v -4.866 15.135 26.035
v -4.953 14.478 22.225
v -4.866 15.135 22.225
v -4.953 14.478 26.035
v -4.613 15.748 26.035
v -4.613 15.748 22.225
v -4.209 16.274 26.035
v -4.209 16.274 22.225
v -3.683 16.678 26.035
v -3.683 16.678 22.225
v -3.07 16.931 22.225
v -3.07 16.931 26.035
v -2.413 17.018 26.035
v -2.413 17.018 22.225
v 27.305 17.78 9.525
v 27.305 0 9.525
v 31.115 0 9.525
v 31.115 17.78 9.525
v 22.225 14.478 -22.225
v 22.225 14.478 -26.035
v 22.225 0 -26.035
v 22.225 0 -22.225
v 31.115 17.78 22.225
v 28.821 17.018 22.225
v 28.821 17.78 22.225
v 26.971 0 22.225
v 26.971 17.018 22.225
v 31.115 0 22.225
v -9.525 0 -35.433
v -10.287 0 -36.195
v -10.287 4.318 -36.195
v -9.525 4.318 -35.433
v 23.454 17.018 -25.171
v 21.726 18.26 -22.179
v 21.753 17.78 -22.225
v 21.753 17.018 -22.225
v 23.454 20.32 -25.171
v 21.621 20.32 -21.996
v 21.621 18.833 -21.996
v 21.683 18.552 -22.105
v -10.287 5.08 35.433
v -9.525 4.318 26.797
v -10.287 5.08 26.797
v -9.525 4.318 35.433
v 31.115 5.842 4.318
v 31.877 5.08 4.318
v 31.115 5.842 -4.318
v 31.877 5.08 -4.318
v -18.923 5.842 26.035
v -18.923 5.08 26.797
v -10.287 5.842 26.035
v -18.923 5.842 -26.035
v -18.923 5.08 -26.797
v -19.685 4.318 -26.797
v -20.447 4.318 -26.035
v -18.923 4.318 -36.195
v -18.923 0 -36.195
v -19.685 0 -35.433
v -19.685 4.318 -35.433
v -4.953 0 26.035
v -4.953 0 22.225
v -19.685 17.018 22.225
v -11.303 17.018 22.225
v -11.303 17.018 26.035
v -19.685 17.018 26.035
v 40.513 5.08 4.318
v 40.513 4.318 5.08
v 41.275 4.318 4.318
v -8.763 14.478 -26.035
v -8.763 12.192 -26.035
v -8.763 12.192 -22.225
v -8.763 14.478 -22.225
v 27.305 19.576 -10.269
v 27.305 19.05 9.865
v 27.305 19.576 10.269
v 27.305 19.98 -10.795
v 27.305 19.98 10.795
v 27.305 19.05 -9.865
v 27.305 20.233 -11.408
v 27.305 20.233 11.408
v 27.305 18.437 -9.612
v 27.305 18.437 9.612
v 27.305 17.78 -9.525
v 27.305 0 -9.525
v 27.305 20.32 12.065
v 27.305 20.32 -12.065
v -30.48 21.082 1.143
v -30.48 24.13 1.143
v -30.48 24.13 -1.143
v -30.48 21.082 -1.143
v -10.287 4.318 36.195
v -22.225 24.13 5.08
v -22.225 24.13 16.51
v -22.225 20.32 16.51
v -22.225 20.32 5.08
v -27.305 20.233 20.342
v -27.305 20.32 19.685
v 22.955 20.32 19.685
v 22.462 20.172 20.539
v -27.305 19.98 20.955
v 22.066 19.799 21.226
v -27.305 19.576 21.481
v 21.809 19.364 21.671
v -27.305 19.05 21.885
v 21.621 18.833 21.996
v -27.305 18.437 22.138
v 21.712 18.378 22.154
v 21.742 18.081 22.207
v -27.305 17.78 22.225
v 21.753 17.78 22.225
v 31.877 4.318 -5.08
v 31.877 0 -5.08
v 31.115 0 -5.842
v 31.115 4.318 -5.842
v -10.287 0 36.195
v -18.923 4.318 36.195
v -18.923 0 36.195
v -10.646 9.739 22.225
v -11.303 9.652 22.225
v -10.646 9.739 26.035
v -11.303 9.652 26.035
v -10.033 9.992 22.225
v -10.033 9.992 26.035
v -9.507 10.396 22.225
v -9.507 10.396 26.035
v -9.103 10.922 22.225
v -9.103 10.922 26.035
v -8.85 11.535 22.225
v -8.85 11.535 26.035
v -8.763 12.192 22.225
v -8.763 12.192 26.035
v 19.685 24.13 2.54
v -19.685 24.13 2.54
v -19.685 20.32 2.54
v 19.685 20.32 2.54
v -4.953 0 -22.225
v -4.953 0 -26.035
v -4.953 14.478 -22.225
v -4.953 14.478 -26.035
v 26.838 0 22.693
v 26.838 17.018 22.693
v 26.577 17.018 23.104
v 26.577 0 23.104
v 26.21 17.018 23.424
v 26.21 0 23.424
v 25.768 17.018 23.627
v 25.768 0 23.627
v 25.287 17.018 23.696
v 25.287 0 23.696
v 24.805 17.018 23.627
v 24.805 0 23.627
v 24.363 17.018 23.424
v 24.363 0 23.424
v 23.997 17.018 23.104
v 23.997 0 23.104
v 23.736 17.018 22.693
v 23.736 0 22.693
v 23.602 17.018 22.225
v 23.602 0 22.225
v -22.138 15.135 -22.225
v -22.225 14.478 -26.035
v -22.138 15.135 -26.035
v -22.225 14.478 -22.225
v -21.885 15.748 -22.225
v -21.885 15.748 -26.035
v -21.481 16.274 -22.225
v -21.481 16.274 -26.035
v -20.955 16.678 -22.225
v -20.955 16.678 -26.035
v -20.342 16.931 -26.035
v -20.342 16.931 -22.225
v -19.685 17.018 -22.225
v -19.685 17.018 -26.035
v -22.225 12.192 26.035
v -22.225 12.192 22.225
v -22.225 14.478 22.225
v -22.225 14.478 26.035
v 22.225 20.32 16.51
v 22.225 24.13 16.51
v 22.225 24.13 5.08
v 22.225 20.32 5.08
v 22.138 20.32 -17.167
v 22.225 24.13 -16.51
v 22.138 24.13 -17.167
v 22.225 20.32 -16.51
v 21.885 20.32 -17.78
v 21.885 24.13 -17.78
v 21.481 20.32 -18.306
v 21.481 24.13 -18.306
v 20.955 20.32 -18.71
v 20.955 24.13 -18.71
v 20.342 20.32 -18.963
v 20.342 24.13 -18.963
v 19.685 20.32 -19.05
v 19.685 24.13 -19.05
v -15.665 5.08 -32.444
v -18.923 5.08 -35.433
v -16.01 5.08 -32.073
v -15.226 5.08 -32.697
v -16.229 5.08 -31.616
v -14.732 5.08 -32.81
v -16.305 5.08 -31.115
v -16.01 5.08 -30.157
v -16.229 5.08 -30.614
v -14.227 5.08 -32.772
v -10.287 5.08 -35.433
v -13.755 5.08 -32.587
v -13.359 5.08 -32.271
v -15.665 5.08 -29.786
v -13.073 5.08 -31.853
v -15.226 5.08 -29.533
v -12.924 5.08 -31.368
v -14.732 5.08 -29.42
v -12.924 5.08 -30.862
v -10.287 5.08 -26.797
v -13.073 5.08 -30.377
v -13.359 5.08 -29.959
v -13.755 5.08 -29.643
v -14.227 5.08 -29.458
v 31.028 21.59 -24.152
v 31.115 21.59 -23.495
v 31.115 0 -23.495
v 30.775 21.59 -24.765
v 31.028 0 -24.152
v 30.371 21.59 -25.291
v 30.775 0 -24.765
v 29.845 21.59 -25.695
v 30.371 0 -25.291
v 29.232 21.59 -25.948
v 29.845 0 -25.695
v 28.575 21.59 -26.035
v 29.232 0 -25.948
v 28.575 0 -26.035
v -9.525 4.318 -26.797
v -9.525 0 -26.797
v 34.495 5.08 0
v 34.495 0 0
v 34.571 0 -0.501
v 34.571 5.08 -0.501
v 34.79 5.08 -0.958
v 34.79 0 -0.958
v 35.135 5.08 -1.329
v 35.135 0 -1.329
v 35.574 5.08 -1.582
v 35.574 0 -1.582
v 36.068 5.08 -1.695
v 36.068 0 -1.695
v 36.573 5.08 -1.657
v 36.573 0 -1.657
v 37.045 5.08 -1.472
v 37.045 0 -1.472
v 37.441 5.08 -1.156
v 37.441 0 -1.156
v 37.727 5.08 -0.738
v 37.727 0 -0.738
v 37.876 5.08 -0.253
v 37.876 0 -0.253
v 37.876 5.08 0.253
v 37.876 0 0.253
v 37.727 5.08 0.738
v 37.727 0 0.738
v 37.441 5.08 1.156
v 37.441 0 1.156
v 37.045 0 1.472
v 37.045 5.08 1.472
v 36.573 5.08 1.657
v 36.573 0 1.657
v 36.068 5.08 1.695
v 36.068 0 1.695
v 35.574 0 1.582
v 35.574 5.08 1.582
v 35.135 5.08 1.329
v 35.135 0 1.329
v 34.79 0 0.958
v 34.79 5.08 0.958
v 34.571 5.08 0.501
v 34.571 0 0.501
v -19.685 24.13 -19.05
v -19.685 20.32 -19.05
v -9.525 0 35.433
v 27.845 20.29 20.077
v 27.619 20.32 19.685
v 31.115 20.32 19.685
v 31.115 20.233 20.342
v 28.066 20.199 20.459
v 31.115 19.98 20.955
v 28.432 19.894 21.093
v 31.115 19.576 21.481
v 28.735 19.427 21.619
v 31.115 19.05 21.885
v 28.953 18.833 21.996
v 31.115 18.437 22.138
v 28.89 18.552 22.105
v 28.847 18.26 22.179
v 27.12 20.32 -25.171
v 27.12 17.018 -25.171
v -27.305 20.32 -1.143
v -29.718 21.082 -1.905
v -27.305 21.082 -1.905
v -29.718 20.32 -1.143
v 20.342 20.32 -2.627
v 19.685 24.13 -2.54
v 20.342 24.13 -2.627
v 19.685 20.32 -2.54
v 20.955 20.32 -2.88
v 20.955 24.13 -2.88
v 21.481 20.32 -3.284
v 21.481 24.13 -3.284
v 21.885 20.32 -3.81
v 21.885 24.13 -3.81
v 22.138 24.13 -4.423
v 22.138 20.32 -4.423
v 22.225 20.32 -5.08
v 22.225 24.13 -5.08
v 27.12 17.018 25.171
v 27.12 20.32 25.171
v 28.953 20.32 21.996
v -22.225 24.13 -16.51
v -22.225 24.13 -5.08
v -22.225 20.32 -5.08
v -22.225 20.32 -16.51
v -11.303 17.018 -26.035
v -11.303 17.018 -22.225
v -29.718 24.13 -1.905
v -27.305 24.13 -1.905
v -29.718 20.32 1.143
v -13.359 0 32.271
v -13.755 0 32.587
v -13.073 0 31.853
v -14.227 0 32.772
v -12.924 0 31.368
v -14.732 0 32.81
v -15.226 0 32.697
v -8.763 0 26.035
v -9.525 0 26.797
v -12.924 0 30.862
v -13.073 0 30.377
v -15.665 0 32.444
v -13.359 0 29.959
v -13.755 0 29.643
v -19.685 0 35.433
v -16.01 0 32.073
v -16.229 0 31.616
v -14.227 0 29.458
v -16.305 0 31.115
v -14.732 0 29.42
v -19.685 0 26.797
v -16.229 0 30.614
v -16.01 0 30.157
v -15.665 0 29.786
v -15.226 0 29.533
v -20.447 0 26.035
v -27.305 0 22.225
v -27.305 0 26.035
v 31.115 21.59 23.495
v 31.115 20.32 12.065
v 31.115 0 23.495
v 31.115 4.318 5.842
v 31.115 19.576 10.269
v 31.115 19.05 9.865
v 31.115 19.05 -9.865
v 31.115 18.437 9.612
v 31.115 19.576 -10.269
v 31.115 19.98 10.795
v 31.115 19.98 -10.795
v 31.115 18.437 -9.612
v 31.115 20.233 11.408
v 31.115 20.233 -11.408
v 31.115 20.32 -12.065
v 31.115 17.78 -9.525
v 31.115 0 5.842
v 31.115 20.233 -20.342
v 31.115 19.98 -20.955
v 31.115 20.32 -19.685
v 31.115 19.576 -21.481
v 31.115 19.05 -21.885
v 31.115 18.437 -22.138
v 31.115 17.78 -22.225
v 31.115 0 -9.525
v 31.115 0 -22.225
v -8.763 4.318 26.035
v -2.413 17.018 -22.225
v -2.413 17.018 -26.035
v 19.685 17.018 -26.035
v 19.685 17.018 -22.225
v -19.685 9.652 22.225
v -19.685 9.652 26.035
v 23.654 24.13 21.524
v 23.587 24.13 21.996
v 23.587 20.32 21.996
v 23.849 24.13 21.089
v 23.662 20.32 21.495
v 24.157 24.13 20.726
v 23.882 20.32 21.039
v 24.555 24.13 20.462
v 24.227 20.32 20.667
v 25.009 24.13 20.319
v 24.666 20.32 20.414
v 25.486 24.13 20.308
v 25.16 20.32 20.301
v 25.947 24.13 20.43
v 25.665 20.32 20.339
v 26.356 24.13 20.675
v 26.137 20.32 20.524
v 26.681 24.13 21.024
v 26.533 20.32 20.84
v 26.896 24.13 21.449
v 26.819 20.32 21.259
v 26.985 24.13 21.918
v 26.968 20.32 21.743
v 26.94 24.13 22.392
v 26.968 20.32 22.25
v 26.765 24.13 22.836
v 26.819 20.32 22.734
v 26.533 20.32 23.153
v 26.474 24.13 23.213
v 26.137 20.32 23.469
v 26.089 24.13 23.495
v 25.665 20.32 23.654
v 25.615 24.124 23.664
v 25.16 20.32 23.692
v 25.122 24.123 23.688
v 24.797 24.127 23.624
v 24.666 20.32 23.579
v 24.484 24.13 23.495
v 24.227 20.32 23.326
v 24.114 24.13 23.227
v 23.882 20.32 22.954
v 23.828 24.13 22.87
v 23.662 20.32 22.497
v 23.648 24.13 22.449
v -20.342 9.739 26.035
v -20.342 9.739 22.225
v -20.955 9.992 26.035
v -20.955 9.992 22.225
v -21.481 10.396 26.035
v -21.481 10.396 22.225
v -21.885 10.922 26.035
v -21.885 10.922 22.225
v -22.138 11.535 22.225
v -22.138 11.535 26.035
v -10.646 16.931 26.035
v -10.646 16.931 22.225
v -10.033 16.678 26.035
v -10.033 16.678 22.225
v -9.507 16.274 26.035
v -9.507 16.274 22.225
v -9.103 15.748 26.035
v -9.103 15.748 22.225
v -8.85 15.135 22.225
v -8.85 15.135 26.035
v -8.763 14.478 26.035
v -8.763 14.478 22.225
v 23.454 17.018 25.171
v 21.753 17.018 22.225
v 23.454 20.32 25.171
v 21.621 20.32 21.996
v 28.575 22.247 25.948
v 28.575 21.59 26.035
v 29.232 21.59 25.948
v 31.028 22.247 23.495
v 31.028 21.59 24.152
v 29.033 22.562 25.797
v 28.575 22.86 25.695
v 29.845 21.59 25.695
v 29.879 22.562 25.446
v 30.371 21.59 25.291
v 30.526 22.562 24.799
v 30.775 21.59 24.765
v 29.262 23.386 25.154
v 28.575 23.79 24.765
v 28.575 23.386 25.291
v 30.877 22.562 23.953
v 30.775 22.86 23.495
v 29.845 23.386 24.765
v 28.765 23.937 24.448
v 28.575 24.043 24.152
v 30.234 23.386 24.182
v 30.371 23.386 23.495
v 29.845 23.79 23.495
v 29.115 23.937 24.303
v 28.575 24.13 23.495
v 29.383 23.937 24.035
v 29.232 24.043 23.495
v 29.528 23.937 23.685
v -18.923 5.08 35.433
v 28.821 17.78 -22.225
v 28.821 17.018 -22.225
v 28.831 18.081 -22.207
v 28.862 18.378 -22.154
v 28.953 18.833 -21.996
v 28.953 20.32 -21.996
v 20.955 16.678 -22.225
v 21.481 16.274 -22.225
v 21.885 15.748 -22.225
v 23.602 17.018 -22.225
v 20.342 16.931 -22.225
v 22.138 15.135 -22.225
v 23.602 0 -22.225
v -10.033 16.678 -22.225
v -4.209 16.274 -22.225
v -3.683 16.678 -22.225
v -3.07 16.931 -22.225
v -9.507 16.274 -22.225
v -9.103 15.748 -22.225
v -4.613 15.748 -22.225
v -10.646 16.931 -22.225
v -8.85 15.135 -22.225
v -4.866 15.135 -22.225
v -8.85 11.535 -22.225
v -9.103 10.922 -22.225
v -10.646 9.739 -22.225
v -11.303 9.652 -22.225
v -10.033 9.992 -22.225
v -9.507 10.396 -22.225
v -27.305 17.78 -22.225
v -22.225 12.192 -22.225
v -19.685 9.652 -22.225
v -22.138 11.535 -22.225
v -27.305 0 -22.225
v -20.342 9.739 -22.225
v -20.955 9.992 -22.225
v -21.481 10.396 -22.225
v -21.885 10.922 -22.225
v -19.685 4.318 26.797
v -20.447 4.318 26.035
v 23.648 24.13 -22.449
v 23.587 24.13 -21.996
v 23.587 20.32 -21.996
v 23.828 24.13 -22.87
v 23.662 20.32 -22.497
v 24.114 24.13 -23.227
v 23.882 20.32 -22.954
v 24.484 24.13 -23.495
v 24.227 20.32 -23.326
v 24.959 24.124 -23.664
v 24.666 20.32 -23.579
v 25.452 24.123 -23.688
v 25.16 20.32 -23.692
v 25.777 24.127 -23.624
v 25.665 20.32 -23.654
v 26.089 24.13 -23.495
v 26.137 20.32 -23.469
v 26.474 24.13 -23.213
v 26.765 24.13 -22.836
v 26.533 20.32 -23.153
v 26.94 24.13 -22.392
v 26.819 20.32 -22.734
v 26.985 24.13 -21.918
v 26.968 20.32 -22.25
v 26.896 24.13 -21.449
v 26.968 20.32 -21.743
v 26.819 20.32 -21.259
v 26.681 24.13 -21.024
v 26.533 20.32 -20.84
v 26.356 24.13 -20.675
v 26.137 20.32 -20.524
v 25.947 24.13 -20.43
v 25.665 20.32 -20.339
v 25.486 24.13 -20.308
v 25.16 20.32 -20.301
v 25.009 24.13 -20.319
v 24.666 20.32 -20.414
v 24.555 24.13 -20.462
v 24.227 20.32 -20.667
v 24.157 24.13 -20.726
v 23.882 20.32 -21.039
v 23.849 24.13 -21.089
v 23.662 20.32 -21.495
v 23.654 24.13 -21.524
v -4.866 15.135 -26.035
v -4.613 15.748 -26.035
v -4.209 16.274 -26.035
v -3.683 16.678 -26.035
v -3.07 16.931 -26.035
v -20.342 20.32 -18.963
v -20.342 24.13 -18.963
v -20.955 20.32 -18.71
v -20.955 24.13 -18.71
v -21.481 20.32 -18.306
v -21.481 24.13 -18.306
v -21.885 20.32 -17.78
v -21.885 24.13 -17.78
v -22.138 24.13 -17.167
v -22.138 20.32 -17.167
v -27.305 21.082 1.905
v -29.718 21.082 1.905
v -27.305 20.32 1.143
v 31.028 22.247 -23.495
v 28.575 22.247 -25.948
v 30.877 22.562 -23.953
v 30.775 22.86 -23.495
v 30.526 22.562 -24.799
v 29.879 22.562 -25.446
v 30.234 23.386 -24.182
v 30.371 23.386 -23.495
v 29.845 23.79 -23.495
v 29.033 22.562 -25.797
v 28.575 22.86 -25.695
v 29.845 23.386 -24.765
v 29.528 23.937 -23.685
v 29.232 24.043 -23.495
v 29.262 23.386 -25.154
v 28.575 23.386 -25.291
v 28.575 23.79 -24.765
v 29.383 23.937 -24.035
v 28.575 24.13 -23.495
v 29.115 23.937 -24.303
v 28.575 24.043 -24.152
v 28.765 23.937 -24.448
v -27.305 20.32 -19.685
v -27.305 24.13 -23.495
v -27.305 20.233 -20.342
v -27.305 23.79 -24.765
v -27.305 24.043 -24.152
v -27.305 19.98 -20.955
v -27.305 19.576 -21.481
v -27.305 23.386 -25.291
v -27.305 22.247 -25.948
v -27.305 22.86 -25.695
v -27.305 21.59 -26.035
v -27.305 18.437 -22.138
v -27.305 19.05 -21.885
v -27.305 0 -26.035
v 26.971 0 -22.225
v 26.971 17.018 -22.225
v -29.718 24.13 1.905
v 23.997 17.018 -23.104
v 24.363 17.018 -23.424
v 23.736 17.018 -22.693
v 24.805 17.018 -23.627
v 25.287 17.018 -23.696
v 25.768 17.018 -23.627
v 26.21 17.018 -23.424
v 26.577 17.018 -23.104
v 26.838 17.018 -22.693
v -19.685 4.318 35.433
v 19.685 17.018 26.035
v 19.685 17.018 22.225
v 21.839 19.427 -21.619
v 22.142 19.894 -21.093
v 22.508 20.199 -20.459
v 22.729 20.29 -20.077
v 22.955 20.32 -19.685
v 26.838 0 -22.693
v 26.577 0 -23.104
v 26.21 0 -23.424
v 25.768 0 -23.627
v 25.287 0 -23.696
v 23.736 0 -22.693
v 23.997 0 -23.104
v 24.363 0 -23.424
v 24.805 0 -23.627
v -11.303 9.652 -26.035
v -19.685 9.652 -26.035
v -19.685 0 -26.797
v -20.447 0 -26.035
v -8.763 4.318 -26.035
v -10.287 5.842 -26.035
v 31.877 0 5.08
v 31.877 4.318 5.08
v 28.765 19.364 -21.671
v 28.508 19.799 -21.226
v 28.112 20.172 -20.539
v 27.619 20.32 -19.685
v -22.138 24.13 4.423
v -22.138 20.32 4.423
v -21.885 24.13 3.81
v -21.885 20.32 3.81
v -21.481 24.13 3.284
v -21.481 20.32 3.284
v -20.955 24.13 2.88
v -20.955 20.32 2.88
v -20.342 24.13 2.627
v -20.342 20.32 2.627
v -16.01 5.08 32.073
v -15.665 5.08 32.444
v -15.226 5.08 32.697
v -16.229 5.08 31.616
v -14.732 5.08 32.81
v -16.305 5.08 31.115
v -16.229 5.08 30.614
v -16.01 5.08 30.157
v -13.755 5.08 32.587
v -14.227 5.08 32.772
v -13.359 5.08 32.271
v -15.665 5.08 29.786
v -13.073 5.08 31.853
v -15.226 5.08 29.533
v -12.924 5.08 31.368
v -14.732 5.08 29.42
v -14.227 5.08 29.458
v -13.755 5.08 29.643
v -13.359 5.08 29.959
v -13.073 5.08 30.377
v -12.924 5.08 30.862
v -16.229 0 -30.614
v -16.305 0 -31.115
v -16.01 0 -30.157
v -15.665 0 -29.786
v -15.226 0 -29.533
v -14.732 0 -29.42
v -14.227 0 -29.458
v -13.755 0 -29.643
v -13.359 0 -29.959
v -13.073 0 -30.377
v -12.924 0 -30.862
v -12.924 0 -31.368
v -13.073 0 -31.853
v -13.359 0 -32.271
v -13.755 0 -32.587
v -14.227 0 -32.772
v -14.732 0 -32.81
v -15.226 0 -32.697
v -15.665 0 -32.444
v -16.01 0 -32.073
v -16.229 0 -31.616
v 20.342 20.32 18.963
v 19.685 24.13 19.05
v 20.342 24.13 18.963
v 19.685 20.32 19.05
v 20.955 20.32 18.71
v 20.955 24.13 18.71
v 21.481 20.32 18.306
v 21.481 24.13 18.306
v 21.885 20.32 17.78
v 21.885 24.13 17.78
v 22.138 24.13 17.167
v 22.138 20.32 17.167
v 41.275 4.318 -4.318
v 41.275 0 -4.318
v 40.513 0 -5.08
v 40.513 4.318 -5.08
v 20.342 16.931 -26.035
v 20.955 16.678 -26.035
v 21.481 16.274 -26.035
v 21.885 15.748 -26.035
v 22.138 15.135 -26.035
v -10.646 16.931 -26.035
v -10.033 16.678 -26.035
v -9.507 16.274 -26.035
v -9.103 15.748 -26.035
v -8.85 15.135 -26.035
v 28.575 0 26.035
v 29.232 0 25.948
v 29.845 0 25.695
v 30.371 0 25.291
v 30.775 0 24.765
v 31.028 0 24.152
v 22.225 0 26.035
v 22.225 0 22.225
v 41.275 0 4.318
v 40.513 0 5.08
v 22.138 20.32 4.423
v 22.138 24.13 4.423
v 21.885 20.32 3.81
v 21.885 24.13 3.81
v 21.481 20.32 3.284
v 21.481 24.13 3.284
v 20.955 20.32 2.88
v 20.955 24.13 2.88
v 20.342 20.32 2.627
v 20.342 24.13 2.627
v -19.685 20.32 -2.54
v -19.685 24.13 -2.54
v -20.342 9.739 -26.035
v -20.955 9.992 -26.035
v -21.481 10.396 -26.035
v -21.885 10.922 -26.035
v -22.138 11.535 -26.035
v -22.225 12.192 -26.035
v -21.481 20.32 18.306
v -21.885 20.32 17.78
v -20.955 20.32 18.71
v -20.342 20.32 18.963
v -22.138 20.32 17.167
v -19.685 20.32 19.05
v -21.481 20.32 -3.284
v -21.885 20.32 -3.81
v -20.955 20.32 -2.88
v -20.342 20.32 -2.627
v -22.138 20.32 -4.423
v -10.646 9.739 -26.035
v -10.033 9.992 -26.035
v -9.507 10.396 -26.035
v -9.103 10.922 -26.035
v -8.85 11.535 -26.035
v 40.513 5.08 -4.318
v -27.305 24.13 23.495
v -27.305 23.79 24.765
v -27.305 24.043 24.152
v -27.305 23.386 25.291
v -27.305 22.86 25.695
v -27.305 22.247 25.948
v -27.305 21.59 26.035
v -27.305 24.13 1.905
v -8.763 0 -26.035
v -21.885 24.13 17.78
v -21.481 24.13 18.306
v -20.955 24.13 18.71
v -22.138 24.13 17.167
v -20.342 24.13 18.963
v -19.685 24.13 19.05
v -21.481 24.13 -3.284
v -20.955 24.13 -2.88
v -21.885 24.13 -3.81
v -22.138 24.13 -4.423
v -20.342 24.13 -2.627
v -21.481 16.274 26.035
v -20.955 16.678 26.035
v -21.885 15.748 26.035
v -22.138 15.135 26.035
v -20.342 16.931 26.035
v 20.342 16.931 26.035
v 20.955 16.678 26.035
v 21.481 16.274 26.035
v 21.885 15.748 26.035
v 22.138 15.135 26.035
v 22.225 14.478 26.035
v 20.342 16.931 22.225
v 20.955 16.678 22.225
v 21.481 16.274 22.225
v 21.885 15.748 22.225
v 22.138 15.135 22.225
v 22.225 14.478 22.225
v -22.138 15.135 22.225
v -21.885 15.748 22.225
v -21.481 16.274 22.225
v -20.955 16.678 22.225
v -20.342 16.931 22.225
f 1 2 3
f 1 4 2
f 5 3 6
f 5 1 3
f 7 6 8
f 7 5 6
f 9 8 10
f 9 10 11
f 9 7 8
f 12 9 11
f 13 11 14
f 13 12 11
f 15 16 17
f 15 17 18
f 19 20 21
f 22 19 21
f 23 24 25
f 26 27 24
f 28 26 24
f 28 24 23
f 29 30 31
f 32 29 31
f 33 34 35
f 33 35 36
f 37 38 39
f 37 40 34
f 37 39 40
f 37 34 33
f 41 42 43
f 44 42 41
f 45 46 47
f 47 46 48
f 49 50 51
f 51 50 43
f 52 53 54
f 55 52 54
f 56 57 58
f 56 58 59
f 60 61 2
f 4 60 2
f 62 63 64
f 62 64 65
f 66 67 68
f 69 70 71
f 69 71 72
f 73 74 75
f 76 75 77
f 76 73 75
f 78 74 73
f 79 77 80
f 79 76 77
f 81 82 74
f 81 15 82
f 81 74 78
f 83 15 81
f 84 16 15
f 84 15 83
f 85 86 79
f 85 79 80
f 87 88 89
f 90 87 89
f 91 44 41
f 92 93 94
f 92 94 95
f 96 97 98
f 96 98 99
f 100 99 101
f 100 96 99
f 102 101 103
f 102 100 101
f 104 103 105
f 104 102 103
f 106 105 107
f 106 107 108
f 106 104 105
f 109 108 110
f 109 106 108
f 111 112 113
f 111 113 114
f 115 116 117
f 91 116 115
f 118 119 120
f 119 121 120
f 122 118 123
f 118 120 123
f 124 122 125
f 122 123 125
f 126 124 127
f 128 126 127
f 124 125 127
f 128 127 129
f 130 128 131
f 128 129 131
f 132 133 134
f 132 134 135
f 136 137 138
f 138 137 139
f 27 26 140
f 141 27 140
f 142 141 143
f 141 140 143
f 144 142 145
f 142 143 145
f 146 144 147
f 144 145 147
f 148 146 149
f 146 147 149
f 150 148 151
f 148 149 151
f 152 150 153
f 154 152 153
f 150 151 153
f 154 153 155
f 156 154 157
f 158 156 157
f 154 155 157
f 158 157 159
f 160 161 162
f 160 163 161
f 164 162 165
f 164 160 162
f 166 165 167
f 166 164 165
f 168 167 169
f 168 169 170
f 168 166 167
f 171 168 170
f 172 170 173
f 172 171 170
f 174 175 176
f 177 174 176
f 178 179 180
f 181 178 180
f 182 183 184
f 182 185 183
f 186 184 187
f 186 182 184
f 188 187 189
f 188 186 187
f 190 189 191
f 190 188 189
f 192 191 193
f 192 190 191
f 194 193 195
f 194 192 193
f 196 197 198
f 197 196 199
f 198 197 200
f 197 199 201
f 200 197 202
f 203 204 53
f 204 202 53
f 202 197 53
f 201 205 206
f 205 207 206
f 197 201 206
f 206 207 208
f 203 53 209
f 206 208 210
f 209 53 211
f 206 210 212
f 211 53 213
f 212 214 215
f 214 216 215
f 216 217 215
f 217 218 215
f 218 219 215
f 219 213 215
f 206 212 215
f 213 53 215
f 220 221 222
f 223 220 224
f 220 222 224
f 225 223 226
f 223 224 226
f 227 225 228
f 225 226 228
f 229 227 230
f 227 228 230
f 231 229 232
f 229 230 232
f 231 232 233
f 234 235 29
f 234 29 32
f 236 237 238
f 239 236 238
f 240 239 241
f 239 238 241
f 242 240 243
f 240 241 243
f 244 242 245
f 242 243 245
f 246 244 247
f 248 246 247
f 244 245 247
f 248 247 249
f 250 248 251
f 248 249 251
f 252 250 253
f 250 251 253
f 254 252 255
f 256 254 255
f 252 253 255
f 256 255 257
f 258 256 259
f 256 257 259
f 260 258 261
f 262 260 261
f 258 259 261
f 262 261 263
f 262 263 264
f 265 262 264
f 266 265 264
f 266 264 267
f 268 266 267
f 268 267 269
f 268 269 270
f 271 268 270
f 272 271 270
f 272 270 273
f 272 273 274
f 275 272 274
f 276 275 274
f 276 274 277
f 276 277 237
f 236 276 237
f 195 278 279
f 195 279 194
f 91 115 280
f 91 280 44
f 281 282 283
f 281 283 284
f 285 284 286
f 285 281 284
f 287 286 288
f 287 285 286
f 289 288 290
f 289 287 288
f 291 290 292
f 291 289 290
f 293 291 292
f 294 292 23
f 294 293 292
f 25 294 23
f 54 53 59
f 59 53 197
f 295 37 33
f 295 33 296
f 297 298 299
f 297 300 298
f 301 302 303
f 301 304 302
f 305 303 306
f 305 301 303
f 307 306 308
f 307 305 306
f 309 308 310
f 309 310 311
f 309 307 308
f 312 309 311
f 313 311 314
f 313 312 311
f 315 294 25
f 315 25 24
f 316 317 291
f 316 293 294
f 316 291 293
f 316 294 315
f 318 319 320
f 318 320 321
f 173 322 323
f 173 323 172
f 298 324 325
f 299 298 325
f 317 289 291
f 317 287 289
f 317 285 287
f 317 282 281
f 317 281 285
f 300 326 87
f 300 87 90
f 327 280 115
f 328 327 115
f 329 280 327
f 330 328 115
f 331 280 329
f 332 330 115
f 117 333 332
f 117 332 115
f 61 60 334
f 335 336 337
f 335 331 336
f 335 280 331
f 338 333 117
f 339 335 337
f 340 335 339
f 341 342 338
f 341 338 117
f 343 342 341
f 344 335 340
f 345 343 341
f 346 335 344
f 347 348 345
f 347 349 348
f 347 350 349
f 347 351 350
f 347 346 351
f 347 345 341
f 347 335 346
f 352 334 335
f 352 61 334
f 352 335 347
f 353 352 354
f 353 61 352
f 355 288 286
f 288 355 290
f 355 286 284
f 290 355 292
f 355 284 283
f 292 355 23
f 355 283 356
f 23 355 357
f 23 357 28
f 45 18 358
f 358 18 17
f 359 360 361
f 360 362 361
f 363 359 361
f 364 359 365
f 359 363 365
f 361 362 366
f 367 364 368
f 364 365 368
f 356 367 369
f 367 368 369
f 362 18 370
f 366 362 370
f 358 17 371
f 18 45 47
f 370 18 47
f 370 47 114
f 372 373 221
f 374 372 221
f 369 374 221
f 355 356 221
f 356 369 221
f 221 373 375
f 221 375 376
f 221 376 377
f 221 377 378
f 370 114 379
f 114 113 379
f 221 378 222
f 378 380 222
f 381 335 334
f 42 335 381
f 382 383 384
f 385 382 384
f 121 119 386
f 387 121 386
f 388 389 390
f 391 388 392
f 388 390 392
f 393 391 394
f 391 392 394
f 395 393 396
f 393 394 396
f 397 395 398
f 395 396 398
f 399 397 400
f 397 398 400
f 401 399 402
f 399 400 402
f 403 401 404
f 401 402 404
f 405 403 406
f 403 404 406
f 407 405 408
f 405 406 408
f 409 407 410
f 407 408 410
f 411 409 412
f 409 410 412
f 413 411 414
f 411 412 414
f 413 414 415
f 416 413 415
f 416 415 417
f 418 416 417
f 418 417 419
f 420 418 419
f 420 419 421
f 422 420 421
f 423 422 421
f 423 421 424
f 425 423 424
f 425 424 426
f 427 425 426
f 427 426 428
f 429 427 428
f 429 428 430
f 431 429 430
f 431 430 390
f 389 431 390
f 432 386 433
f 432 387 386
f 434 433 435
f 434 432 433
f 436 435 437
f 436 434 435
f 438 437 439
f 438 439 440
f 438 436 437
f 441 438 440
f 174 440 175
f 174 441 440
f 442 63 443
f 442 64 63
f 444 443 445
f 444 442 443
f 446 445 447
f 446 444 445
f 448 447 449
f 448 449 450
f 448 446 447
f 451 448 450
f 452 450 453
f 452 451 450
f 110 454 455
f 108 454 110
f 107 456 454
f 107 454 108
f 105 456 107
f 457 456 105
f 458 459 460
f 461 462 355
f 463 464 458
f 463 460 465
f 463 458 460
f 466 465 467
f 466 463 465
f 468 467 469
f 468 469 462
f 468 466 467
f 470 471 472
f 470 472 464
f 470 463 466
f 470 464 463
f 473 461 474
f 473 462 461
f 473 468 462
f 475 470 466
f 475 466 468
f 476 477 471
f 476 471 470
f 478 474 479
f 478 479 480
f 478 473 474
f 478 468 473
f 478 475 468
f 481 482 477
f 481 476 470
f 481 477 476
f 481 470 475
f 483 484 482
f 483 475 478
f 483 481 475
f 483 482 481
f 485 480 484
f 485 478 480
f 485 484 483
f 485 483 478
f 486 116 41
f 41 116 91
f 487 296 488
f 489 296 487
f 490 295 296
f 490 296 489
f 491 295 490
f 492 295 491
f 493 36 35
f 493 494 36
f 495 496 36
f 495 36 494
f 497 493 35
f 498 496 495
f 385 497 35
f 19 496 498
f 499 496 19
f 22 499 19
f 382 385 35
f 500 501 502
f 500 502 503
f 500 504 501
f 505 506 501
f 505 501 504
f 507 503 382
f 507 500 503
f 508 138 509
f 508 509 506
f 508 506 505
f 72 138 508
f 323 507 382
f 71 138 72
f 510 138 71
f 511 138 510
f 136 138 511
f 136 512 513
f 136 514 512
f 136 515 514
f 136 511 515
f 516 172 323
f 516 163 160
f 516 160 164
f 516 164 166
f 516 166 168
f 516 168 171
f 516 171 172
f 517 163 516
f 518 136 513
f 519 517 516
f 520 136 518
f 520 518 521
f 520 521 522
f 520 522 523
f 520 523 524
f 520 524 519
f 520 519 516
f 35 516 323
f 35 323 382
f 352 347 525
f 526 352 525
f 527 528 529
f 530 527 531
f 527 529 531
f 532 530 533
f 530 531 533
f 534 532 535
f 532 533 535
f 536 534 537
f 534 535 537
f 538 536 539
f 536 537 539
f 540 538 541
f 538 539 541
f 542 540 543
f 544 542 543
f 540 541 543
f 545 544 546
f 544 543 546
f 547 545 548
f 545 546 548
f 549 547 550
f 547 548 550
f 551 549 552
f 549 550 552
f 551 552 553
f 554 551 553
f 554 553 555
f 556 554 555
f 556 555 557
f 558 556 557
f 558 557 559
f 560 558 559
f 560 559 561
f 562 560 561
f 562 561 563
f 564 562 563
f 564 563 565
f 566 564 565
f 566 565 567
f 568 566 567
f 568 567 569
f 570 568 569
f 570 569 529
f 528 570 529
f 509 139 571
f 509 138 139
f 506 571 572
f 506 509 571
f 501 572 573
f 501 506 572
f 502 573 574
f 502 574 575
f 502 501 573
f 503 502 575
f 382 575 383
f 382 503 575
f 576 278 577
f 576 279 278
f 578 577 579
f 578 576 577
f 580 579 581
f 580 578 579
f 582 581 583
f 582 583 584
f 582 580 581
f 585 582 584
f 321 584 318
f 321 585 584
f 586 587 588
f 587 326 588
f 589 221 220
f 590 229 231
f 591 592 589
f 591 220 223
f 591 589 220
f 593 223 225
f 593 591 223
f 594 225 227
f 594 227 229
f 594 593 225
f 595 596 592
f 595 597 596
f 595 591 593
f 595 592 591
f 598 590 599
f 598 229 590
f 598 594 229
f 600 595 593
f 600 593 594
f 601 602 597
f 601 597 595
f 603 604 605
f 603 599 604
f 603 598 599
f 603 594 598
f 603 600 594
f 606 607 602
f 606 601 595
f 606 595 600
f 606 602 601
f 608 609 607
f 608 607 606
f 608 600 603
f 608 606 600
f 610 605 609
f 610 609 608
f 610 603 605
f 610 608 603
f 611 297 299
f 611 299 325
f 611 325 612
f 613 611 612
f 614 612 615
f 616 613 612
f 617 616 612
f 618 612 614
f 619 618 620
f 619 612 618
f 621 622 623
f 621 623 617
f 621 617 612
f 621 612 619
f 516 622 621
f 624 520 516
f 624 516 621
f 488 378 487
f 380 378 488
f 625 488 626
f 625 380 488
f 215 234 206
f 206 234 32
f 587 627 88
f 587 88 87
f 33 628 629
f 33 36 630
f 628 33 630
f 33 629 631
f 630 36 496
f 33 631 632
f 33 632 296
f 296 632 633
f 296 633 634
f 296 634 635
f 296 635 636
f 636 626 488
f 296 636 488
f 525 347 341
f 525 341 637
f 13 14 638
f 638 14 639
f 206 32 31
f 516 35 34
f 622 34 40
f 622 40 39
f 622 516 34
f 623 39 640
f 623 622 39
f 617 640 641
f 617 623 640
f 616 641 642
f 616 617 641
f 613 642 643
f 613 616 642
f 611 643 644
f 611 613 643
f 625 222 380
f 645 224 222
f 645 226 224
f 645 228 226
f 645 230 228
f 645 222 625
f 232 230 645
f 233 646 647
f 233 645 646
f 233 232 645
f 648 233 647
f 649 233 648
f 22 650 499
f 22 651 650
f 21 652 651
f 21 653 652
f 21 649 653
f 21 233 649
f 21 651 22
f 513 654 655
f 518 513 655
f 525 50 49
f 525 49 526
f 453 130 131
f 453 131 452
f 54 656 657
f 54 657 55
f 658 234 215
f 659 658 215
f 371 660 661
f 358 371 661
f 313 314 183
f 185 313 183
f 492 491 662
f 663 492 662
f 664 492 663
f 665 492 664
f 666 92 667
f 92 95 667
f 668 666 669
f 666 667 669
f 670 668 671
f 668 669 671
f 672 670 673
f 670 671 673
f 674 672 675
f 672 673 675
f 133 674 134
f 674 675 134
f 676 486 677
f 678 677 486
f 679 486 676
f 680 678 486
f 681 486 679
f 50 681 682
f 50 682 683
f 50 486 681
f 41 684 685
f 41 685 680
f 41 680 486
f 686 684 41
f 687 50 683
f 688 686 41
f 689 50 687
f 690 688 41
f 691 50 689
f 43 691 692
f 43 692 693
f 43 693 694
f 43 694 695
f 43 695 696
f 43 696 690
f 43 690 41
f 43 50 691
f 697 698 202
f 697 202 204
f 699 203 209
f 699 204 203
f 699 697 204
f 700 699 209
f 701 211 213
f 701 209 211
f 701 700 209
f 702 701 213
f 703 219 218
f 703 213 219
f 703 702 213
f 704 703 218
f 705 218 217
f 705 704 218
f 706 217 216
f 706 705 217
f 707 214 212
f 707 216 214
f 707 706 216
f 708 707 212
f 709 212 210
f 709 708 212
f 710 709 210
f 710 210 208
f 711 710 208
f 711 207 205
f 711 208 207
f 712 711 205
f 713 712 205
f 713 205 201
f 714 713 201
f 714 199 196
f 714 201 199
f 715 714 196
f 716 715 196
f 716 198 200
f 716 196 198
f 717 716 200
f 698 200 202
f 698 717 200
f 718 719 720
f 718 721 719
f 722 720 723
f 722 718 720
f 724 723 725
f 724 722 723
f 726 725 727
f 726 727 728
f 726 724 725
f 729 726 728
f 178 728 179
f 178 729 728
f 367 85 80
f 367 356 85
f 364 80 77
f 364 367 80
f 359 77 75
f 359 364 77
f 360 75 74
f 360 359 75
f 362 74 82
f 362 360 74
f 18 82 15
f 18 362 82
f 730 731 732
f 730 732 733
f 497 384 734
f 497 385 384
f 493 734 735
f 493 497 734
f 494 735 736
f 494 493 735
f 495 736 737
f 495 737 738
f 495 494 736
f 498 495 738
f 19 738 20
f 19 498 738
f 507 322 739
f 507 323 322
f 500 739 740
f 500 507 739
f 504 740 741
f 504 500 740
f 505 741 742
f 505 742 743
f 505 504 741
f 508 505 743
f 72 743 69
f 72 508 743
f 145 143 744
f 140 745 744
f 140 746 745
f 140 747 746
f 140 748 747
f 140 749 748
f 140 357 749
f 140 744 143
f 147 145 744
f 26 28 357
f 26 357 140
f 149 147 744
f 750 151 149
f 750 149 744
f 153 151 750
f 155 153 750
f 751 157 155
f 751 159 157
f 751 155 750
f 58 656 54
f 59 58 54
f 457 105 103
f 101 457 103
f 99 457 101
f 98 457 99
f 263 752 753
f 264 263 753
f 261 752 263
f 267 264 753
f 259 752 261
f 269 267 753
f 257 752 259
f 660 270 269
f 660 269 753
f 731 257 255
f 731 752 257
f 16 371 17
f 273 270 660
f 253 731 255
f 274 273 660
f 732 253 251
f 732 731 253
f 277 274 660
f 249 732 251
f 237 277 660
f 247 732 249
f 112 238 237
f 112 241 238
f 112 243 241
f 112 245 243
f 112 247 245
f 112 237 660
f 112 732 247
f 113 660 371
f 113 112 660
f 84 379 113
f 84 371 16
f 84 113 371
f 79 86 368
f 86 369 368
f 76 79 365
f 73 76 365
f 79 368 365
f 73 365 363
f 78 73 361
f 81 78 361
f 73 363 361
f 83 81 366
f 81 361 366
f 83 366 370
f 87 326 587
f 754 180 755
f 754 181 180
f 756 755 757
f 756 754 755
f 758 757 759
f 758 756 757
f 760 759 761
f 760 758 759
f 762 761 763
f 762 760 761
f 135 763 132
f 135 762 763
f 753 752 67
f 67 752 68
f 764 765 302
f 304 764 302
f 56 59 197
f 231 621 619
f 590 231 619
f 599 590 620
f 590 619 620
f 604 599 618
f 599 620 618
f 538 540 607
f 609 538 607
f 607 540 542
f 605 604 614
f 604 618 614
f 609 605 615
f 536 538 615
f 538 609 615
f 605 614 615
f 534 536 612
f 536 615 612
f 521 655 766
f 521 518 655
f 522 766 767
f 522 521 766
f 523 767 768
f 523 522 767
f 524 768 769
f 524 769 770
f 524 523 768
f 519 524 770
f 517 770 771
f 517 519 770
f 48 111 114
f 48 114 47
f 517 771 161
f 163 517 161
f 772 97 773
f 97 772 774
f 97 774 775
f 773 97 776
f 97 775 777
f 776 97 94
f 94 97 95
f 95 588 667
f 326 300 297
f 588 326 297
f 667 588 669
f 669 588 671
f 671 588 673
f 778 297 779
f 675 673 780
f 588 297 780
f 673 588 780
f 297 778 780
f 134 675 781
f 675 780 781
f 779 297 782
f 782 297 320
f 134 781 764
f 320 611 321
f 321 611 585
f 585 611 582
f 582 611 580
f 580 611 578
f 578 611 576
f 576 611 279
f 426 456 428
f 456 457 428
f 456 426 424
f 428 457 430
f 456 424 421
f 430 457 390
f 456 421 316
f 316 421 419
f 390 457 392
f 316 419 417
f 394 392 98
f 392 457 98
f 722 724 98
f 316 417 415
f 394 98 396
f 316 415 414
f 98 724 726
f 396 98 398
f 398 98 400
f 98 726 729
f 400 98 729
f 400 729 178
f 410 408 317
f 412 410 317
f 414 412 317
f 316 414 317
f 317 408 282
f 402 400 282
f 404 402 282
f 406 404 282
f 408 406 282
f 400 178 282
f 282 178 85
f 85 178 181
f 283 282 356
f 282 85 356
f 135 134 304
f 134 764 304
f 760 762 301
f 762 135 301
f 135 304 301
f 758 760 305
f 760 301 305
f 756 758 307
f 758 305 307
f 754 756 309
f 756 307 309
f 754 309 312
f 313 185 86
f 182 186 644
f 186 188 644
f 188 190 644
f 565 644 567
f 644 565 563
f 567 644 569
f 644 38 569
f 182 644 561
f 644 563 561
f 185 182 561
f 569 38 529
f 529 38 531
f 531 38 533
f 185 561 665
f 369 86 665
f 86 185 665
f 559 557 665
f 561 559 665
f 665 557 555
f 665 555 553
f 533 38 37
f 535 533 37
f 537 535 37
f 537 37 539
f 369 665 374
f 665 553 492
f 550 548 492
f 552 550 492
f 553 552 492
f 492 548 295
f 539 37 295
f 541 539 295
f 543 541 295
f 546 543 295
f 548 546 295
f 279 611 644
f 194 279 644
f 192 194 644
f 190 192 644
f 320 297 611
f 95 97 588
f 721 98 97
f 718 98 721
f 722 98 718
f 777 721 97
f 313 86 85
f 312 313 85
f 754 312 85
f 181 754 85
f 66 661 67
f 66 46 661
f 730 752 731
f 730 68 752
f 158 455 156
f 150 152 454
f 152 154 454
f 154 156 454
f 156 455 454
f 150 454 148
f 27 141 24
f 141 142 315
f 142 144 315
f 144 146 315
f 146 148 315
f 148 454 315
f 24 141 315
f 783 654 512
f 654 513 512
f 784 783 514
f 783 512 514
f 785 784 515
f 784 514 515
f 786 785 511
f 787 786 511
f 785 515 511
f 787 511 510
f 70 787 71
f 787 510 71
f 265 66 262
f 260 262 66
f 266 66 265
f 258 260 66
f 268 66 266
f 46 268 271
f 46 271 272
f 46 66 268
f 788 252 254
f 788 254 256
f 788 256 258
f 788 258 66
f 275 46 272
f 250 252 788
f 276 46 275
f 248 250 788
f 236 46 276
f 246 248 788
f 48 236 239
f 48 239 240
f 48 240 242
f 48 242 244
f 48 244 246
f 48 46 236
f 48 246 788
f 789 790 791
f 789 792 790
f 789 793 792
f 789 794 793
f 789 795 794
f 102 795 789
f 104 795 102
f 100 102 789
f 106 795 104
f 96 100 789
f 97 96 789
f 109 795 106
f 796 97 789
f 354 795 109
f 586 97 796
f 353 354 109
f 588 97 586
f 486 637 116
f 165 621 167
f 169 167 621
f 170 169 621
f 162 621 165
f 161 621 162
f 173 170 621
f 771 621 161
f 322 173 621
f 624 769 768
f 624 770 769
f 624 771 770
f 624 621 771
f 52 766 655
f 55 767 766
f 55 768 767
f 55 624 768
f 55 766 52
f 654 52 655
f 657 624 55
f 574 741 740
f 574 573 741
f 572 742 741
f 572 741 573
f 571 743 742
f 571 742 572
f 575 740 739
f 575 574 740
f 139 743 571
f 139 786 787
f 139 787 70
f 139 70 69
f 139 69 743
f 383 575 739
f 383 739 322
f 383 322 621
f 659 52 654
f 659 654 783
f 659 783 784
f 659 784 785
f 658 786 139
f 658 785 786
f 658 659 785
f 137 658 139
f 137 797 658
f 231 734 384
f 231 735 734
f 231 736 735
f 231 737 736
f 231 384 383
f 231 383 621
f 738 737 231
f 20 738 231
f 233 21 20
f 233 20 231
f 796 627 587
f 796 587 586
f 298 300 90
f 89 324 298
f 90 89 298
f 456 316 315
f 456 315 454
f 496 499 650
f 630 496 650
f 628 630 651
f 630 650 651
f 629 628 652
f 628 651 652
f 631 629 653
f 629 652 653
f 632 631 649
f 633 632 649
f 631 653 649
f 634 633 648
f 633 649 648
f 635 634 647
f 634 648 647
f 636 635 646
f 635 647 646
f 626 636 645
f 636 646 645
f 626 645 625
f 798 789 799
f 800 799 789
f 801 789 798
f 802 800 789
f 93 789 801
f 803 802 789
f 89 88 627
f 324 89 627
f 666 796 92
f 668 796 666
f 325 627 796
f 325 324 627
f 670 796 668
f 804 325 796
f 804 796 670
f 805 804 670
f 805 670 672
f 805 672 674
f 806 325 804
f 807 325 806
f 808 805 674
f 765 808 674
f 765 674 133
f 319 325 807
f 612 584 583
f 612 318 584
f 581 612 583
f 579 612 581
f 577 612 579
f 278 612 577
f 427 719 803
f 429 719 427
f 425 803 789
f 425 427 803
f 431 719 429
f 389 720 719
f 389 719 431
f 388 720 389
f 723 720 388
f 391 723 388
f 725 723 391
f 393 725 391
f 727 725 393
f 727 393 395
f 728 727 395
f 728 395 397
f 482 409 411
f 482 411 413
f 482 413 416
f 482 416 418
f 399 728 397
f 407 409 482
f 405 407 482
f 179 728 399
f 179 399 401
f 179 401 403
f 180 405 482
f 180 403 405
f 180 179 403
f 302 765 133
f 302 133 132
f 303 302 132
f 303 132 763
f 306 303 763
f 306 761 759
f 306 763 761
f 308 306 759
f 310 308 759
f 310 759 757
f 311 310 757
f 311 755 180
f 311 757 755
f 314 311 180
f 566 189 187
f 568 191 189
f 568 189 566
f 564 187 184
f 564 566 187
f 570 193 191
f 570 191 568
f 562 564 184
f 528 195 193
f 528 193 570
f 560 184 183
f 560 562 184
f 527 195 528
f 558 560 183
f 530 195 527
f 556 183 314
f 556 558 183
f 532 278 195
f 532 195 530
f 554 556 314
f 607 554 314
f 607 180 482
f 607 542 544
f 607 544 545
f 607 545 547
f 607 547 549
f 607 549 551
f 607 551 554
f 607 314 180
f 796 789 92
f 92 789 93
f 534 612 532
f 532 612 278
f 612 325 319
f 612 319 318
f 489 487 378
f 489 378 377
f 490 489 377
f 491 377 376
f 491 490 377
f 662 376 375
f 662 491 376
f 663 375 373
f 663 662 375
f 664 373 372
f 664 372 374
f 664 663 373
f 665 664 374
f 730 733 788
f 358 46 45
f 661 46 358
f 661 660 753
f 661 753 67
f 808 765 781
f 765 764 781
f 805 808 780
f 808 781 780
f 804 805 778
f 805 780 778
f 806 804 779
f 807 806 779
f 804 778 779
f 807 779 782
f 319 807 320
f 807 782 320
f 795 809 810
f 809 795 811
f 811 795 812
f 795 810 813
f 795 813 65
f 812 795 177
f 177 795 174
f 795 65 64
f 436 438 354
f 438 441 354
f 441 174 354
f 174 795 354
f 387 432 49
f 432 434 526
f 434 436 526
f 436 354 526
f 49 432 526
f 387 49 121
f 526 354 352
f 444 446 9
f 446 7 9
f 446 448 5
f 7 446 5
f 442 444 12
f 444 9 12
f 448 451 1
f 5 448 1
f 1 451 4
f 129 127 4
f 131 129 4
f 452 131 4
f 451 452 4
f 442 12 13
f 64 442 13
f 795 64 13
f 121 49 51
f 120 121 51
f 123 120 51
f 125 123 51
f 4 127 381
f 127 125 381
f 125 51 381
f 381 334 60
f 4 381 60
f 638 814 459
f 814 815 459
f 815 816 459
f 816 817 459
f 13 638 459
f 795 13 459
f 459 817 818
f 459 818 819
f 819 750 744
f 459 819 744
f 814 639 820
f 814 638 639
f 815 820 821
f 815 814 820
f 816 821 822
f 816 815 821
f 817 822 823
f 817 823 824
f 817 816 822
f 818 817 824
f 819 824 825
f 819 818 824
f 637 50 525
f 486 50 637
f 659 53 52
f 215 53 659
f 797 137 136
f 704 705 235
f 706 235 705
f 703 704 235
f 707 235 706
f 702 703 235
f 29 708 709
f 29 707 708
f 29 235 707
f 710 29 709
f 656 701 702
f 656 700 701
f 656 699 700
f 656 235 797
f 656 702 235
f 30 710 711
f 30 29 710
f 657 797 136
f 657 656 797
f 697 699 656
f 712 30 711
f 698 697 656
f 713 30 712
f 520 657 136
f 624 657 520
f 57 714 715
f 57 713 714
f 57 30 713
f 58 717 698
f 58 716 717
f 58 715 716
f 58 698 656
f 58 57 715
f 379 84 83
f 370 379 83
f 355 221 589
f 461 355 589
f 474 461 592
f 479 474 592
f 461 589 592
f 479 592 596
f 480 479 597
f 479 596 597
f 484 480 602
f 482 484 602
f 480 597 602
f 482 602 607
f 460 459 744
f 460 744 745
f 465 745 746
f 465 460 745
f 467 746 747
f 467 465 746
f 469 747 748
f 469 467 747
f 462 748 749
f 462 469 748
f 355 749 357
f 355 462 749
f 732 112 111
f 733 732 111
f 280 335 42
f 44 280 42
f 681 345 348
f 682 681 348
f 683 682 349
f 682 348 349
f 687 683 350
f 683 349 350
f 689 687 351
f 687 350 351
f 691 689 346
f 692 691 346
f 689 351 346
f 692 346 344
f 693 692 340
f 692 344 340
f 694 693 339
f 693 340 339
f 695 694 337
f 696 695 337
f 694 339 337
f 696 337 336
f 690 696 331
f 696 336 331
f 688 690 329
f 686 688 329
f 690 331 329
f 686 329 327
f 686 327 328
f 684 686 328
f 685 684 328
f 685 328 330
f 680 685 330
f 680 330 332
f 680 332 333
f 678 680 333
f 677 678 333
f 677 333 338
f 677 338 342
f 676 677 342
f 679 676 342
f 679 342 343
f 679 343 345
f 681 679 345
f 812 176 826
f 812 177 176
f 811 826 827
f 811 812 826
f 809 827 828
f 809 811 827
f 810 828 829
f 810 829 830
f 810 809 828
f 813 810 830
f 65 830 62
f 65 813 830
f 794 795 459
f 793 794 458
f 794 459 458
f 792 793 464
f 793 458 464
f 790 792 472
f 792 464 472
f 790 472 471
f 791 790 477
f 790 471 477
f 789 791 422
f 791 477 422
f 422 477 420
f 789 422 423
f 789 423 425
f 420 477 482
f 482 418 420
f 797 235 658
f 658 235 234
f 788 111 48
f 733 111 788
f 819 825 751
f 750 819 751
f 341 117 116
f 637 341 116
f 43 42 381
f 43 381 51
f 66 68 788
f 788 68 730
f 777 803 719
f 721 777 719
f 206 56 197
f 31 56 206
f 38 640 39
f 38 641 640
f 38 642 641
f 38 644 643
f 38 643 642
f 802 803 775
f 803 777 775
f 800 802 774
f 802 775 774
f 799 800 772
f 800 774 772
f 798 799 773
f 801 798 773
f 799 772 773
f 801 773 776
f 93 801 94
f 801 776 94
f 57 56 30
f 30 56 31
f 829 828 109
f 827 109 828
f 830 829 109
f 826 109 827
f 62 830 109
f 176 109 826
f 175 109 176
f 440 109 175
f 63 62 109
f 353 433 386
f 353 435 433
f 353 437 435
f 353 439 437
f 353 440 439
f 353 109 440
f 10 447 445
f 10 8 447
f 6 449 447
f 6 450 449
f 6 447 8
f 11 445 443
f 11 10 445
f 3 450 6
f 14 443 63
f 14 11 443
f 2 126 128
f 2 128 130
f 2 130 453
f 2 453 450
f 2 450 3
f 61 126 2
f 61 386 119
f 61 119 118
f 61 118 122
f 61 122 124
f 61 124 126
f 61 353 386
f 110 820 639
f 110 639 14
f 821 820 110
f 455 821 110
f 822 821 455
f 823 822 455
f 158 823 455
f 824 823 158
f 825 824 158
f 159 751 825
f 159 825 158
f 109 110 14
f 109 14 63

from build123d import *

# Parameters (mm, degrees)
BOSS_EXTRUDE1_DEPTH      = 20.32
SKETCH2_W                = 58.42
SKETCH2_H                = 52.07
BOSS_EXTRUDE2_DEPTH      = 3.81
SKETCH3_W                = 12.7
SKETCH3_H                = 20.32
CUT_EXTRUDE1_DEPTH       = 3.81
FILLET2_R                = 2.54
SKETCH4_W                = 10.16
SKETCH4_H                = 5.08
BOSS_EXTRUDE3_DEPTH      = 10.16
CHAMFER1_SIZE            = 0.762
SKETCH5_W                = 10.16
SKETCH5_H                = 5.08
BOSS_EXTRUDE4_DEPTH      = 10.16
CHAMFER2_SIZE            = 0.762
CHAMFER2_OF_MIRROR1_SIZE = 0.762
M3_CLEARANCE_HOLE1_D     = 3.4
M3_CLEARANCE_HOLE2_D     = 3.4
CUT_EXTRUDE2_REACH       = 61.966
SKETCH13_W               = 44.45
SKETCH13_H               = 16.51
SKETCH15_W               = 13.462
SKETCH15_H               = 7.366
CUT_EXTRUDE4_DEPTH       = 79.475827011
FILLET3_R                = 2.54
SKETCH16_W               = 6.35
SKETCH16_H               = 3.81
BOSS_EXTRUDE5_DEPTH      = 3.81
CHAMFER3_SIZE            = 0.762
M3_CLEARANCE_HOLE4_D     = 3.4
CUT_EXTRUDE5_DEPTH       = 3.302
FILLET4_R                = 2.54


with BuildPart() as part:
    # Sketch1 → Boss-Extrude1 (new body)
    with BuildSketch(Plane(origin=(0, 0, 0), x_dir=(1, 0, 0), z_dir=(0, 1, 0))):
        Polygon((-27.305, 22.225), (-27.305, 26.035), (31.115, 26.035), (31.115, -26.035), (-27.305, -26.035), (-27.305, -22.225), (27.305, -22.225), (27.305, 22.225), align=None)
    extrude(amount=BOSS_EXTRUDE1_DEPTH)

    # Sketch2 → Boss-Extrude2 (add)
    with BuildSketch(Plane(origin=(0, 20.32, 0), x_dir=(1, 0, 0), z_dir=(0, 1, 0))):
        with Locations((1.905, 0)):
            Rectangle(SKETCH2_W, SKETCH2_H)
    extrude(amount=BOSS_EXTRUDE2_DEPTH)

    # Sketch3 → Cut-Extrude1 (cut)
    with BuildSketch(Plane.ZY.offset(-27.305)):
        with Locations((-15.875, 10.16)):
            Rectangle(SKETCH3_W, SKETCH3_H)
        with Locations((15.875, 10.16)):
            Rectangle(SKETCH3_W, SKETCH3_H)
    extrude(amount=-CUT_EXTRUDE1_DEPTH, mode=Mode.SUBTRACT)

    # Fillet2
    fillet2_edges = [part.edges().sort_by_distance(p)[0] for p in [
        (31.115, 12.065, -26.035),
        (31.115, 12.065, 26.035),
        (31.115, 24.13, 0),
    ]]
    fillet(fillet2_edges, radius=FILLET2_R)

    # Sketch4 → Boss-Extrude3 (add)
    with BuildSketch(Plane(origin=(31.115, 0, 0), x_dir=(0, 0, -1), z_dir=(1, 0, 0))):
        with Locations((0, 2.54)):
            Rectangle(SKETCH4_W, SKETCH4_H)
    extrude(amount=BOSS_EXTRUDE3_DEPTH)

    # Chamfer1
    chamfer1_edges = [part.edges().sort_by_distance(p)[0] for p in [
        (31.115, 2.54, 5.08),
        (36.195, 5.08, 5.08),
        (31.115, 2.54, -5.08),
        (31.115, 5.08, 0),
        (36.195, 5.08, -5.08),
        (41.275, 2.54, 5.08),
        (41.275, 2.54, -5.08),
        (41.275, 5.08, 0),
    ]]
    chamfer(chamfer1_edges, length=CHAMFER1_SIZE)

    # Sketch5 → Boss-Extrude4 (add)
    with BuildSketch(Plane.XY.offset(26.035)):
        with Locations((-14.605, 2.54)):
            Rectangle(SKETCH5_W, SKETCH5_H)
    boss_extrude4 = extrude(amount=BOSS_EXTRUDE4_DEPTH)

    # Chamfer2
    chamfer2_edges = [part.edges().sort_by_distance(p)[0] for p in [
        (-19.685, 2.54, 26.035),
        (-19.685, 5.08, 31.115),
        (-9.525, 2.54, 26.035),
        (-14.605, 5.08, 26.035),
        (-9.525, 5.08, 31.115),
        (-19.685, 2.54, 36.195),
        (-9.525, 2.54, 36.195),
        (-14.605, 5.08, 36.195),
    ]]
    chamfer(chamfer2_edges, length=CHAMFER2_SIZE)

    # Mirror1: Boss-Extrude4 across plane
    add(boss_extrude4.mirror(Plane.XY))

    # Chamfer2 of Mirror1
    chamfer2_of_mirror1_edges = [part.edges().sort_by_distance(p)[0] for p in [
        (-19.685, 2.54, -26.035),
        (-19.685, 5.08, -31.115),
        (-9.525, 2.54, -26.035),
        (-14.605, 5.08, -26.035),
        (-9.525, 5.08, -31.115),
        (-19.685, 2.54, -36.195),
        (-9.525, 2.54, -36.195),
        (-14.605, 5.08, -36.195),
    ]]
    chamfer(chamfer2_of_mirror1_edges, length=CHAMFER2_OF_MIRROR1_SIZE)

    # M3 Clearance Hole1 (through all)
    with Locations(Plane(origin=(0, 5.08, 0), x_dir=(1, 0, 0), z_dir=(0, 1, 0))):
        with Locations((-14.605, -31.115)):
            m3_clearance_hole1 = Hole(M3_CLEARANCE_HOLE1_D / 2)

    # Mirror2: M3 Clearance Hole1 across plane
    add(m3_clearance_hole1.mirror(Plane.XY), mode=Mode.SUBTRACT)

    # M3 Clearance Hole2 (through all)
    with Locations(Plane(origin=(0, 5.08, 0), x_dir=(1, 0, 0), z_dir=(0, 1, 0))):
        with Locations((36.195, 0)):
            Hole(M3_CLEARANCE_HOLE2_D / 2)

    # Sketch13 → Cut-Extrude2 (cut, up to next)
    with BuildSketch(Plane(origin=(0, 24.13, 0), x_dir=(1, 0, 0), z_dir=(0, 1, 0)), mode=Mode.PRIVATE) as cut_extrude2_sk1:
        with Locations((0, -10.795)):
            Rectangle(SKETCH13_W, SKETCH13_H)
    cut_extrude2_tool1 = extrude(cut_extrude2_sk1.sketch, amount=-CUT_EXTRUDE2_REACH, mode=Mode.PRIVATE) & part.part
    # Sketch13 → Cut-Extrude2 (cut, up to next)
    with BuildSketch(Plane(origin=(0, 24.13, 0), x_dir=(1, 0, 0), z_dir=(0, 1, 0)), mode=Mode.PRIVATE) as cut_extrude2_sk2:
        with Locations((0, 10.795)):
            Rectangle(SKETCH13_W, SKETCH13_H)
    cut_extrude2_tool2 = extrude(cut_extrude2_sk2.sketch, amount=-CUT_EXTRUDE2_REACH, mode=Mode.PRIVATE) & part.part
    add(cut_extrude2_tool1.solids().sort_by_distance((0, 24.13, 10.795))[0], mode=Mode.SUBTRACT)
    add(cut_extrude2_tool2.solids().sort_by_distance((0, 24.13, -10.795))[0], mode=Mode.SUBTRACT)

    # Sketch15 → Cut-Extrude4 (cut, through all)
    with BuildSketch(Plane(origin=(0, 0, -26.035), x_dir=(-1, 0, 0), z_dir=(0, 0, -1))):
        Polygon((-22.225, 0), (4.953, 0), (4.953, 9.652), (4.953, 17.018), (-22.225, 17.018), align=None)
        with Locations((15.494, 13.335)):
            Rectangle(SKETCH15_W, SKETCH15_H)
    extrude(amount=-CUT_EXTRUDE4_DEPTH, mode=Mode.SUBTRACT)

    # Fillet3
    fillet3_edges = [part.edges().sort_by_distance(p)[0] for p in [
        (-22.225, 22.225, 19.05),
        (-22.225, 22.225, 2.54),
        (1.905, 20.32, -22.225),
        (22.225, 22.225, 2.54),
        (22.225, 22.225, 19.05),
        (22.225, 22.225, -19.05),
        (22.225, 22.225, -2.54),
        (-22.225, 22.225, -2.54),
        (-22.225, 22.225, -19.05),
        (22.225, 17.018, 24.13),
        (22.225, 17.018, -24.13),
        (-4.953, 17.018, 24.13),
        (-4.953, 17.018, -24.13),
        (-22.225, 17.018, 24.13),
        (-22.225, 17.018, -24.13),
        (-22.225, 9.652, 24.13),
        (-22.225, 9.652, -24.13),
        (-8.763, 9.652, 24.13),
        (-8.763, 9.652, -24.13),
        (-8.763, 17.018, 24.13),
        (-8.763, 17.018, -24.13),
        (29.21, 20.32, -9.525),
        (29.21, 20.32, 9.525),
        (1.905, 20.32, 22.225),
    ]]
    fillet(fillet3_edges, radius=FILLET3_R)

    # Sketch16 → Boss-Extrude5 (add)
    with BuildSketch(Plane(origin=(0, 24.13, 0), x_dir=(1, 0, 0), z_dir=(0, 1, 0))):
        with Locations((-27.305, 0)):
            Rectangle(SKETCH16_W, SKETCH16_H)
    extrude(amount=-BOSS_EXTRUDE5_DEPTH)

    # Chamfer3
    chamfer3_edges = [part.edges().sort_by_distance(p)[0] for p in [
        (-28.8925, 20.32, -1.905),
        (-28.8925, 20.32, 1.905),
        (-30.48, 20.32, 0),
        (-30.48, 22.225, -1.905),
        (-30.48, 22.225, 1.905),
    ]]
    chamfer(chamfer3_edges, length=CHAMFER3_SIZE)

    # M3 Clearance Hole4 (through all)
    with Locations(Plane(origin=(0, 24.13, 0), x_dir=(1, 0, 0), z_dir=(0, 1, 0))):
        with Locations((25.286866606, -21.9964), (25.286866606, 21.9964)):
            Hole(M3_CLEARANCE_HOLE4_D / 2)

    # Sketch22 → Cut-Extrude5 (cut)
    with BuildSketch(Plane.XZ.offset(-20.32)):
        Polygon((28.953040816, 21.9964), (27.119953711, 25.1714), (23.453779502, 25.1714), (21.620692397, 21.9964), (23.453779502, 18.8214), (27.119953711, 18.8214), align=None)
        Polygon((28.953040816, -21.9964), (27.119953711, -18.8214), (23.453779502, -18.8214), (21.620692397, -21.9964), (23.453779502, -25.1714), (27.119953711, -25.1714), align=None)
    extrude(amount=CUT_EXTRUDE5_DEPTH, mode=Mode.SUBTRACT)

    # Fillet4
    # the kernel refuses this fillet: 2.54 mm, written as the material it takes off along each edge
    with BuildSketch(Plane(origin=(28.575, 21.59, 23.495), x_dir=(0, 0, 1), z_dir=(0, 1, 0))) as fillet4_piece_1_section:
        Polygon((0, 0), (FILLET4_R, 0), (FILLET4_R, FILLET4_R), (0, FILLET4_R), align=None)
    fillet4_piece_1 = extrude(amount=FILLET4_R, mode=Mode.PRIVATE)
    fillet4_piece_1 = fillet4_piece_1 - Plane(origin=(28.575, 21.59, 23.495), x_dir=(-0.7071067811865475, 0, -0.7071067811865475), z_dir=(0, 1, 0)) * Sphere(FILLET4_R, mode=Mode.PRIVATE)
    add(fillet4_piece_1, mode=Mode.SUBTRACT)
    with BuildSketch(Plane(origin=(28.575, 21.59, -23.495), x_dir=(0, 0, -1), z_dir=(0, 1, 0))) as fillet4_piece_2_section:
        Polygon((0, 0), (FILLET4_R, 0), (FILLET4_R, -FILLET4_R), (0, -FILLET4_R), align=None)
    fillet4_piece_2 = extrude(amount=FILLET4_R, mode=Mode.PRIVATE)
    fillet4_piece_2 = fillet4_piece_2 - Plane(origin=(28.575, 21.59, -23.495), x_dir=(-0.7071067811865475, 0, 0.7071067811865475), z_dir=(0, 1, 0)) * Sphere(FILLET4_R, mode=Mode.PRIVATE)
    add(fillet4_piece_2, mode=Mode.SUBTRACT)
    with BuildSketch(Plane(origin=(28.575, 24.13, 26.035), x_dir=(0, 0, -1), z_dir=(-1, 0, 0)), Plane(origin=(-33.655, 24.13, -26.035), x_dir=(0, 0, 1), z_dir=(1, 0, 0))) as fillet4_piece_3:
        with BuildLine():
            CenterArc((FILLET4_R, FILLET4_R), FILLET4_R, 180, 90)
            Line((0, FILLET4_R), (0, 0))
            Line((0, 0), (FILLET4_R, 0))
        make_face()
    extrude(amount=62.23, mode=Mode.SUBTRACT)


solid = part.part
